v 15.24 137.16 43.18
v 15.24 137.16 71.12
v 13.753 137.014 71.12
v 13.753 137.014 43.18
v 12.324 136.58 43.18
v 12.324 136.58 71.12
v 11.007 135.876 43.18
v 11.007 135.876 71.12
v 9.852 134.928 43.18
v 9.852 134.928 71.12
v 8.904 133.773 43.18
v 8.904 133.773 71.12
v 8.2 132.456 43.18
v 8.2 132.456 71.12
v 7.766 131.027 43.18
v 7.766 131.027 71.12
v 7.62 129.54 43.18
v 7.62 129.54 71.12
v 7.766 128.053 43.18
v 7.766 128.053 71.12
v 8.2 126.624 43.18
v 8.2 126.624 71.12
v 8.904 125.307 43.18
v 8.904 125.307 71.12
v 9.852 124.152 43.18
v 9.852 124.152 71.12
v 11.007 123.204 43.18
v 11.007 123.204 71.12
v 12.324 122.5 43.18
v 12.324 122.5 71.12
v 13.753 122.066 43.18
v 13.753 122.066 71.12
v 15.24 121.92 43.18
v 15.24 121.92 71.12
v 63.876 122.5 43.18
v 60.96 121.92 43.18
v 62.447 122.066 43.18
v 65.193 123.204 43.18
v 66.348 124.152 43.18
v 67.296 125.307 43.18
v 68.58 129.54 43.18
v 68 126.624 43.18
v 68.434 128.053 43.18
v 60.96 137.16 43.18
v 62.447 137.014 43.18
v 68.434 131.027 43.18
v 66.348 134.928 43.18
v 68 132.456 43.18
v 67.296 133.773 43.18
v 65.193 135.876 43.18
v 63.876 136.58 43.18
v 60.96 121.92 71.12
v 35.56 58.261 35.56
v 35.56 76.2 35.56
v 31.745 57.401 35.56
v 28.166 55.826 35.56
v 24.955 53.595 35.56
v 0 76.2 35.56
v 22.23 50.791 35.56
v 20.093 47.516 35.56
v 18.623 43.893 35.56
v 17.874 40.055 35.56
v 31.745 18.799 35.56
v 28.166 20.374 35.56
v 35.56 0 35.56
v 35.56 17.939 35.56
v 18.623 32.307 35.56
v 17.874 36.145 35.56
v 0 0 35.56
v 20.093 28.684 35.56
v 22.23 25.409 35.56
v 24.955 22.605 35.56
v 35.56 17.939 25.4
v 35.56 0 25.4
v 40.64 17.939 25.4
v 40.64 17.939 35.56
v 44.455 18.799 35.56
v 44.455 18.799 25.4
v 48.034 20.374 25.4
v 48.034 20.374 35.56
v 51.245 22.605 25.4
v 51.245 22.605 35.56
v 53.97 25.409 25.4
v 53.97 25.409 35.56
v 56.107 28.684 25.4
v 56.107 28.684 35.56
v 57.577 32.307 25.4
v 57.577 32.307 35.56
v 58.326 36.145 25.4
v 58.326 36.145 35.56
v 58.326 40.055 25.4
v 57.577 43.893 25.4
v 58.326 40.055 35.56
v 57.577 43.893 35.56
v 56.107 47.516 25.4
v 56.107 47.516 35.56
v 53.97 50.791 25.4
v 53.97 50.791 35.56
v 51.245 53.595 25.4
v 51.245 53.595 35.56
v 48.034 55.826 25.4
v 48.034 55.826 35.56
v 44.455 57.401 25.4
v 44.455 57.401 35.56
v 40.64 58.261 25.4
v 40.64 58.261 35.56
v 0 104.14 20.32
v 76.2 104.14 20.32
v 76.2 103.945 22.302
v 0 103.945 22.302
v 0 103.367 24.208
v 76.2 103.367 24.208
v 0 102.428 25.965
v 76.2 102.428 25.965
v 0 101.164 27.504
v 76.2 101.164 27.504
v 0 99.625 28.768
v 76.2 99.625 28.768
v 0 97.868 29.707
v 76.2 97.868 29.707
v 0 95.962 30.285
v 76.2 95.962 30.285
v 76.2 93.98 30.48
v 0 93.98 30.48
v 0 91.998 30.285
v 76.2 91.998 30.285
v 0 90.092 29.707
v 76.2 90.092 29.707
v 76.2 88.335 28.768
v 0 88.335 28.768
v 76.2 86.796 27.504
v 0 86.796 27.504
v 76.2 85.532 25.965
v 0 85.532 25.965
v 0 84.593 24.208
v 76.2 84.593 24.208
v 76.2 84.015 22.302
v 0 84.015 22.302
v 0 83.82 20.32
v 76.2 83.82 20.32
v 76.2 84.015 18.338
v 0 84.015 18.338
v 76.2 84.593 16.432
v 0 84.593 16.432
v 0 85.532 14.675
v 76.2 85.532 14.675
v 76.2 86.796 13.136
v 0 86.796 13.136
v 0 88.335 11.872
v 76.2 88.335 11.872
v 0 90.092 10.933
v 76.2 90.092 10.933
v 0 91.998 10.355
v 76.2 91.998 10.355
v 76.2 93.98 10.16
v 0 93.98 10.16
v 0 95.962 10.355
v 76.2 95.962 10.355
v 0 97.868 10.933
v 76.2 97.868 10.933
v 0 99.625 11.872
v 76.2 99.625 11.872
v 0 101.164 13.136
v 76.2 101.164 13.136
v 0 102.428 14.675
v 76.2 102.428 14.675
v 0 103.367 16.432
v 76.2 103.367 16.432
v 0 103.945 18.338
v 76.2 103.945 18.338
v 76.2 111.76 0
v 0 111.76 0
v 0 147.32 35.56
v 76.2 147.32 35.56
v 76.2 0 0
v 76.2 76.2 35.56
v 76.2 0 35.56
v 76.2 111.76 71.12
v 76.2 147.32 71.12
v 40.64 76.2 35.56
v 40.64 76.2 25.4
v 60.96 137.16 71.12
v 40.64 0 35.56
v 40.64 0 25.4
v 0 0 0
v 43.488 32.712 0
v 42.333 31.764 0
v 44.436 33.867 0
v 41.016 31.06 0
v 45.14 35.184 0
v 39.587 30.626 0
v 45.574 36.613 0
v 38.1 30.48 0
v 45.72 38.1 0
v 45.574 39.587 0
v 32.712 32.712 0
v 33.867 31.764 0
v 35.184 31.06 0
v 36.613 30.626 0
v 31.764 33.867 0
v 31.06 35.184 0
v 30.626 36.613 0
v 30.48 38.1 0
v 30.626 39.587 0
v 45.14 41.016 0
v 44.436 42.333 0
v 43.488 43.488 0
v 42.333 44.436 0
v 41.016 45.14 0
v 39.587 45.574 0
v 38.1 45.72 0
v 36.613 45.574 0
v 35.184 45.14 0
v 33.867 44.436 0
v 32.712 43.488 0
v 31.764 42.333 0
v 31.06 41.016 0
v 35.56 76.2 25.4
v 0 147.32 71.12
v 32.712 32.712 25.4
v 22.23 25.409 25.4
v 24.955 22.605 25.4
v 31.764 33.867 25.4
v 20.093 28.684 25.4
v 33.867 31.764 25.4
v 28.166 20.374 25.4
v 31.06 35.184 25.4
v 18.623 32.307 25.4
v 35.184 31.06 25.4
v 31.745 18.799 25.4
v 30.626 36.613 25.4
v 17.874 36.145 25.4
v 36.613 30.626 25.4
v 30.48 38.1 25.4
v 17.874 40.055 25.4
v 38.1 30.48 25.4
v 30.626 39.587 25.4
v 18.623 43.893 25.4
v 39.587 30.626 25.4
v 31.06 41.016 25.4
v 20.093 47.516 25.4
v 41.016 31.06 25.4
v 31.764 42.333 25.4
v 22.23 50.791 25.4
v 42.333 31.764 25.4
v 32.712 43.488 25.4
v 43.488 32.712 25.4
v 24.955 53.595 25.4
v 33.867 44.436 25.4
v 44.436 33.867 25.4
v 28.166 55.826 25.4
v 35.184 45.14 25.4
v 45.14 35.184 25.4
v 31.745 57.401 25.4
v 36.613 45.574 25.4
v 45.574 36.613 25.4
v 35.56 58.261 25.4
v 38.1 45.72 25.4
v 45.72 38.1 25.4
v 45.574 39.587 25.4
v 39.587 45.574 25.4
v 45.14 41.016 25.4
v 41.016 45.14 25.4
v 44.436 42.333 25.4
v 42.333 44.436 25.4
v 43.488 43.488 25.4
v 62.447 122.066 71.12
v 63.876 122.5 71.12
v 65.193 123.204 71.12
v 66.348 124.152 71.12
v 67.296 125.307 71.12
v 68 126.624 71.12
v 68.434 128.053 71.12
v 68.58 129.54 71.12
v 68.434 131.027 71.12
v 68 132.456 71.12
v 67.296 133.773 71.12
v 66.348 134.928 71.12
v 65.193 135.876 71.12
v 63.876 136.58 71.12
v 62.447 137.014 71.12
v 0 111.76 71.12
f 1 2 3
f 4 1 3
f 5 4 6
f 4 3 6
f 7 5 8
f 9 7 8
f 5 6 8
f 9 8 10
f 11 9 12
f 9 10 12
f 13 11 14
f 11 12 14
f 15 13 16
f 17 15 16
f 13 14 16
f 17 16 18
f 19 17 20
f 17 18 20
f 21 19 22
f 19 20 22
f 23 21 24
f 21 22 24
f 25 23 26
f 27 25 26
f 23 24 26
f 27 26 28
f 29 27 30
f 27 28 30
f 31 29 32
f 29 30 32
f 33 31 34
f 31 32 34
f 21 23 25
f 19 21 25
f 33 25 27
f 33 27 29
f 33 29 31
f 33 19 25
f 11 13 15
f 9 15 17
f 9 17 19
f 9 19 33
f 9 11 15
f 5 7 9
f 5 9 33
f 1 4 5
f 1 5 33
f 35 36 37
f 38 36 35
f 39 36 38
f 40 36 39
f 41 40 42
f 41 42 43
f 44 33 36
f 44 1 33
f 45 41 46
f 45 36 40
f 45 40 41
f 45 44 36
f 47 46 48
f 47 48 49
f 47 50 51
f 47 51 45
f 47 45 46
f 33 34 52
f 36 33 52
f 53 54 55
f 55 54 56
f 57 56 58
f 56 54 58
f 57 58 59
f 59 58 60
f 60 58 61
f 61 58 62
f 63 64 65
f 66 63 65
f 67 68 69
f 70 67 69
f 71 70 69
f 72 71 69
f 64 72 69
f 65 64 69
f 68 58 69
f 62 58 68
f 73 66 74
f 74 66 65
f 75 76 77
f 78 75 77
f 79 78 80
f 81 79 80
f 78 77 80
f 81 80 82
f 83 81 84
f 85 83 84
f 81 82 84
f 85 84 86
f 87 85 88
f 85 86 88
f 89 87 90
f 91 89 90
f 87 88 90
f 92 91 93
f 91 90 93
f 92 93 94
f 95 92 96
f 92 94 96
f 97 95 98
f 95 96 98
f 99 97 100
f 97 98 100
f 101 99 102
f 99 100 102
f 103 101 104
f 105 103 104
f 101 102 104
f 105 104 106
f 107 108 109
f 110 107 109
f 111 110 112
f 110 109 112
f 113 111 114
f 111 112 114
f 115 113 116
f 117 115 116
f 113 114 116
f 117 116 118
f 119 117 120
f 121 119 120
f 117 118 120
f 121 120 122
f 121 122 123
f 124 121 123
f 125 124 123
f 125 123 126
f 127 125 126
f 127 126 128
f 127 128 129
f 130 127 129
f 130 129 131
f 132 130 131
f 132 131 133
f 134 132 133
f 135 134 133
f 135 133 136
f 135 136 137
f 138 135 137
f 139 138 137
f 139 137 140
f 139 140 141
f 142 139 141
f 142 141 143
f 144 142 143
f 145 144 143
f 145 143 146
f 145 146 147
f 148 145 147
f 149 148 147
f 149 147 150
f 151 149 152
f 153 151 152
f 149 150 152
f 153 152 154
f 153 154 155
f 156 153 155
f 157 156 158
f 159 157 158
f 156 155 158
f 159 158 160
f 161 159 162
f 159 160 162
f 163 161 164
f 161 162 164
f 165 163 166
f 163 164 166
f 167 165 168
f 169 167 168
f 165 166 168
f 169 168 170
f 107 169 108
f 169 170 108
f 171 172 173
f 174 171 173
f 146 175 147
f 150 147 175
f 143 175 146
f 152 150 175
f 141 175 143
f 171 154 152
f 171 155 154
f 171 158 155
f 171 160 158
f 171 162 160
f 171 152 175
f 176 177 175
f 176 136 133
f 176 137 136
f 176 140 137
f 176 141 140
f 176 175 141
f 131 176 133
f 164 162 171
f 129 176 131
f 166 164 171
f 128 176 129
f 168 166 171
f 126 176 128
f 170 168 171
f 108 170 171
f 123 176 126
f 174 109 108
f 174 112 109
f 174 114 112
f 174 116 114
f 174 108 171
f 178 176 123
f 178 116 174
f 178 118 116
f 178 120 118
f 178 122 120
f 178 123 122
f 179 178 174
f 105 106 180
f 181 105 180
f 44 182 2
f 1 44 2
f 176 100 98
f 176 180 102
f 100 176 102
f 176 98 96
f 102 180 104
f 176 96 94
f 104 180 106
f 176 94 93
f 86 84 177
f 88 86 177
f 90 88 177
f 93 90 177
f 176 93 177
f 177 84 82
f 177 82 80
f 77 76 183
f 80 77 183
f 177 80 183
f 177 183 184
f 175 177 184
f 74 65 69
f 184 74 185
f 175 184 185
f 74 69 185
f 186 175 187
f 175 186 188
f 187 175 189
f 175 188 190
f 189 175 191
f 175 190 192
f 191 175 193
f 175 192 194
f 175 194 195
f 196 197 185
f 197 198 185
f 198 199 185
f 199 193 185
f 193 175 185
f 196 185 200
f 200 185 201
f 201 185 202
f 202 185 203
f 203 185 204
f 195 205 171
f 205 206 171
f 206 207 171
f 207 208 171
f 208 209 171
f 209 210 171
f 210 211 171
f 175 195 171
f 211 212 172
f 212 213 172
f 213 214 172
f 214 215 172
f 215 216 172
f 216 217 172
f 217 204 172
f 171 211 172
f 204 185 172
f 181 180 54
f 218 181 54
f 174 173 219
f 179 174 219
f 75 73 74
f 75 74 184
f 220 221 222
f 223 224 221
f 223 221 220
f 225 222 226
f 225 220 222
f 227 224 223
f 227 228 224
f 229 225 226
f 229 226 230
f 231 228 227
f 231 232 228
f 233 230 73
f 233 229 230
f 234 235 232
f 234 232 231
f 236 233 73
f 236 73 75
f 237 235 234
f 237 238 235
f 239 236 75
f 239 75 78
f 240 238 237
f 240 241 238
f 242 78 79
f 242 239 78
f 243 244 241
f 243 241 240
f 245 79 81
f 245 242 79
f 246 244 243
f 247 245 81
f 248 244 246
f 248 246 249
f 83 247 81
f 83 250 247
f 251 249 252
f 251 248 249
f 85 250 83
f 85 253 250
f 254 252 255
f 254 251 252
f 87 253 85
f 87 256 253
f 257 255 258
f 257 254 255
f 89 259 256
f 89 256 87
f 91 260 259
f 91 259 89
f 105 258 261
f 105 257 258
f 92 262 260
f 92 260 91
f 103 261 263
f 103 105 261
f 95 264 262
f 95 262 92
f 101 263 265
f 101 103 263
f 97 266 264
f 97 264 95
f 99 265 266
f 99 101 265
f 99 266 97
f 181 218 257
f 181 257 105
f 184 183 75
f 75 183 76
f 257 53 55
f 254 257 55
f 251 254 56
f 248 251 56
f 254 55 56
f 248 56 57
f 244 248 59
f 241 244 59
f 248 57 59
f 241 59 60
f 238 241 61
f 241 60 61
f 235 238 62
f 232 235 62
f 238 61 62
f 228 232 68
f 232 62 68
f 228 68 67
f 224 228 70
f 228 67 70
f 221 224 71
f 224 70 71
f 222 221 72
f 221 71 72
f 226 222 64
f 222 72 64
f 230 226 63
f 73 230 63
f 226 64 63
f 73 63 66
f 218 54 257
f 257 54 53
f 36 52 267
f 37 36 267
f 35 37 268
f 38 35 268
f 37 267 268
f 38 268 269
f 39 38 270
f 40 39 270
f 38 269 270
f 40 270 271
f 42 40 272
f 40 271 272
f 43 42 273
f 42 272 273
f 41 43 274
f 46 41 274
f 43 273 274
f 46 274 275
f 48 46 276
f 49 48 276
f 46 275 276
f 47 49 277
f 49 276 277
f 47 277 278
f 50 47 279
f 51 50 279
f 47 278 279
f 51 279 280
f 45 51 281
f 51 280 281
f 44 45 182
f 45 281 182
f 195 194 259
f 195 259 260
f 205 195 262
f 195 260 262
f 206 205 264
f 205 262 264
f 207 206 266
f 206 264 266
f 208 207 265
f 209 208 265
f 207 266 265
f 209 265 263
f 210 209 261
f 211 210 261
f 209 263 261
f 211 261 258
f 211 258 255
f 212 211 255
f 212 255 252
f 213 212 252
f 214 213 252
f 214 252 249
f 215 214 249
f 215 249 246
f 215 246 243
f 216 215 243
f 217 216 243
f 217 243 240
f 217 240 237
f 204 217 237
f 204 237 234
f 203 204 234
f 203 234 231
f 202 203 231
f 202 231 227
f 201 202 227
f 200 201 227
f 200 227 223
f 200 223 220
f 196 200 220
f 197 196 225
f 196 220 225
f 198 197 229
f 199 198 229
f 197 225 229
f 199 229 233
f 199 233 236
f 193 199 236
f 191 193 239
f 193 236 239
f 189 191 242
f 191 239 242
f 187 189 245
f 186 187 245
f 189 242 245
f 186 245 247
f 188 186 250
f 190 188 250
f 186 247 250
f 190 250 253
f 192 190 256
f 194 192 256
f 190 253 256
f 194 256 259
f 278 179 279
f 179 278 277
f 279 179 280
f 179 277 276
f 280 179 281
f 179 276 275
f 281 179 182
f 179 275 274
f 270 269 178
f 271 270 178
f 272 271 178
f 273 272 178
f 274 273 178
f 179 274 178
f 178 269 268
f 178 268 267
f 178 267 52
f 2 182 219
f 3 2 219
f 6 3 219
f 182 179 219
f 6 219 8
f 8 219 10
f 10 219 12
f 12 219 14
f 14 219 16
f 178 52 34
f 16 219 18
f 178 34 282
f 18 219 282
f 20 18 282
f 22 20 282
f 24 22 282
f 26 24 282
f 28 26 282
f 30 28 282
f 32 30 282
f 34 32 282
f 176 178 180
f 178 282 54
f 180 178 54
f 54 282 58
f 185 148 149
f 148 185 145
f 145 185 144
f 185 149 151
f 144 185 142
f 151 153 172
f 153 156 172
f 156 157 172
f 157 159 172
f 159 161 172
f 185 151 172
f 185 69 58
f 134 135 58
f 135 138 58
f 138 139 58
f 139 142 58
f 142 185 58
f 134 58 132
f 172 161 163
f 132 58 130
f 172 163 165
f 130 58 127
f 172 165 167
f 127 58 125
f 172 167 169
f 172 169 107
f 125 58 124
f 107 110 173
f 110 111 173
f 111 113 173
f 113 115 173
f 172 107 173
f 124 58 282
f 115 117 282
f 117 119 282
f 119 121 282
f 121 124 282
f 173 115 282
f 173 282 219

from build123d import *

# Parameters (mm, degrees)
F1_DEPTH = 76.2
F4_DEPTH = 10.16
F6_R     = 7.62
F7_DEPTH = 25.401
F2_R     = 10.16
F8_DEPTH = 76.201
F9_DEPTH = 27.94


with BuildPart() as f1:
    # F0 (on Right) → F1 (new body)
    with BuildSketch(Plane.YZ):
        Polygon((0, 35.56), (0, 0), (111.76, 0), (147.32, 35.56), (147.32, 71.12), (111.76, 71.12), (76.2, 35.56), align=None)
    extrude(amount=F1_DEPTH)

    # F3 (on face) → F4 (cut)
    with BuildSketch(Plane.XY.offset(35.56)):
        with BuildLine():
            Line((35.56, 76.2), (35.56, 58.260625))
            ThreePointArc((35.56, 58.260625), (17.78, 38.1), (35.56, 17.939375))
            Line((35.56, 17.939375), (35.56, 0))
            Line((35.56, 0), (40.64, 0))
            Line((40.64, 0), (40.64, 17.939375))
            ThreePointArc((40.64, 17.939375), (58.42, 38.1), (40.64, 58.260625))
            Line((40.64, 58.260625), (40.64, 76.2))
            Line((40.64, 76.2), (35.56, 76.2))
        make_face()
    extrude(amount=-F4_DEPTH, mode=Mode.SUBTRACT)

    # F6 (on face) → F7 (cut, through all)
    with BuildSketch(Plane.XY.offset(25.4)):
        with Locations((38.1, 38.1)):
            Circle(F6_R)
    extrude(amount=-F7_DEPTH, mode=Mode.SUBTRACT)

    # F2 (on face) → F8 (cut, through all)
    with BuildSketch(Plane.YZ.offset(76.2)):
        with Locations((93.98, 20.32)):
            Circle(F2_R)
    extrude(amount=-F8_DEPTH, mode=Mode.SUBTRACT)

    # F5 (on face) → F9 (cut)
    with BuildSketch(Plane.XY.offset(71.12)):
        with BuildLine():
            Line((60.96, 137.16), (15.24, 137.16))
            ThreePointArc((15.24, 137.16), (7.62, 129.54), (15.24, 121.92))
            Line((15.24, 121.92), (60.96, 121.92))
            ThreePointArc((60.96, 121.92), (68.58, 129.54), (60.96, 137.16))
        make_face()
    extrude(amount=-F9_DEPTH, mode=Mode.SUBTRACT)


solid = f1.part
